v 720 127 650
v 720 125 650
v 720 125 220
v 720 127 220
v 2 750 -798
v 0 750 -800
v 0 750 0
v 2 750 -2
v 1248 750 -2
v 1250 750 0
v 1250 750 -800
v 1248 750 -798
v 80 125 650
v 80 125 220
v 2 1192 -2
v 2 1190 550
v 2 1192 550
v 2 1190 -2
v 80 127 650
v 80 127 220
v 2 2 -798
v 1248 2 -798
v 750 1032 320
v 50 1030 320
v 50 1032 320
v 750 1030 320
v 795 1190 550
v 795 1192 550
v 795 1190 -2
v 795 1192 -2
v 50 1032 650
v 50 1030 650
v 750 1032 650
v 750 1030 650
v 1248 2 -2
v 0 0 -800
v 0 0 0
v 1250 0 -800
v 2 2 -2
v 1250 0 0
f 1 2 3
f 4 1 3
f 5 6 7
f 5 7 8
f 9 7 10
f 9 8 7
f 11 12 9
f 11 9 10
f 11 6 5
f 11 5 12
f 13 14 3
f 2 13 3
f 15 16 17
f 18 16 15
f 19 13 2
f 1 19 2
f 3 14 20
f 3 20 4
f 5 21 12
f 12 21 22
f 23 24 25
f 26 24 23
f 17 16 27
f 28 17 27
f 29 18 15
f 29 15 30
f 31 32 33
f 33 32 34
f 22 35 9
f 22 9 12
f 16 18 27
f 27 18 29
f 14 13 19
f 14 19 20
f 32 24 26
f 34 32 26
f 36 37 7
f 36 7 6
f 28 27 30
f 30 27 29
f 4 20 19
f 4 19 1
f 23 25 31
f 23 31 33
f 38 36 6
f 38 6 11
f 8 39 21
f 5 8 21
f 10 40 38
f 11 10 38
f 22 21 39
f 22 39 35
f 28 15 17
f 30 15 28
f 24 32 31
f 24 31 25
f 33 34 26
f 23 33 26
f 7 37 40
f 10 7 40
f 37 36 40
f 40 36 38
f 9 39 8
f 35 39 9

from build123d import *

# Parameters (mm, degrees)
MASTER_FOOTPRINT_W            = 1250
MASTER_FOOTPRINT_H            = 800
BATH_BASE_PLATE_DEPTH         = 750
BATH_SHELL_2MM_T              = -2
INLET_IMPACT_BAFFLE_START     = 125
SKETCH_1_W                    = 640
SKETCH_1_H                    = 430
INLET_IMPACT_BAFFLE_DEPTH     = 2
OUTLET_SUBMERGED_BAFFLE_START = 1030
SKETCH_3_W                    = 700
SKETCH_3_H                    = 330
OUTLET_SUBMERGED_BAFFLE_DEPTH = 2
OVERFLOW_WEIR_Z550_START      = 1190
SKETCH_4_W                    = 793
SKETCH_4_H                    = 552
OVERFLOW_WEIR_Z550_DEPTH      = 2


with BuildPart() as part:
    # MASTER_FOOTPRINT → BATH_BASE_PLATE (new body)
    with BuildSketch(Plane(origin=(0, 0, 0), x_dir=(1, 0, 0), z_dir=(0, 1, 0))):
        with Locations((625, 400)):
            Rectangle(MASTER_FOOTPRINT_W, MASTER_FOOTPRINT_H)
    extrude(amount=BATH_BASE_PLATE_DEPTH)

    # BATH_SHELL_2MM
    bath_shell_2mm_openings = [part.faces().sort_by_distance(p)[0] for p in [
        (625, 750, -400),
    ]]
    offset(amount=BATH_SHELL_2MM_T, openings=bath_shell_2mm_openings, kind=Kind.INTERSECTION)


with BuildPart() as body_2:
    # Эскиз1 → INLET_IMPACT_BAFFLE (new body)
    with BuildSketch(Plane(origin=(0, 0, 0), x_dir=(1, 0, 0), z_dir=(0, 1, 0)).offset(INLET_IMPACT_BAFFLE_START)):
        with Locations((400, -435)):
            Rectangle(SKETCH_1_W, SKETCH_1_H)
    extrude(amount=INLET_IMPACT_BAFFLE_DEPTH)


with BuildPart() as body_3:
    # Эскиз3 → OUTLET_SUBMERGED_BAFFLE (new body)
    with BuildSketch(Plane(origin=(0, 0, 0), x_dir=(1, 0, 0), z_dir=(0, 1, 0)).offset(OUTLET_SUBMERGED_BAFFLE_START)):
        with Locations((400, -485)):
            Rectangle(SKETCH_3_W, SKETCH_3_H)
    extrude(amount=OUTLET_SUBMERGED_BAFFLE_DEPTH)


with BuildPart() as body_4:
    # Эскиз4 → OVERFLOW_WEIR_Z550 (new body)
    with BuildSketch(Plane(origin=(0, 0, 0), x_dir=(1, 0, 0), z_dir=(0, 1, 0)).offset(OVERFLOW_WEIR_Z550_START)):
        with Locations((398.5, -274)):
            Rectangle(SKETCH_4_W, SKETCH_4_H)
    extrude(amount=OVERFLOW_WEIR_Z550_DEPTH)


solid = Compound([part.part, body_2.part, body_3.part, body_4.part])
